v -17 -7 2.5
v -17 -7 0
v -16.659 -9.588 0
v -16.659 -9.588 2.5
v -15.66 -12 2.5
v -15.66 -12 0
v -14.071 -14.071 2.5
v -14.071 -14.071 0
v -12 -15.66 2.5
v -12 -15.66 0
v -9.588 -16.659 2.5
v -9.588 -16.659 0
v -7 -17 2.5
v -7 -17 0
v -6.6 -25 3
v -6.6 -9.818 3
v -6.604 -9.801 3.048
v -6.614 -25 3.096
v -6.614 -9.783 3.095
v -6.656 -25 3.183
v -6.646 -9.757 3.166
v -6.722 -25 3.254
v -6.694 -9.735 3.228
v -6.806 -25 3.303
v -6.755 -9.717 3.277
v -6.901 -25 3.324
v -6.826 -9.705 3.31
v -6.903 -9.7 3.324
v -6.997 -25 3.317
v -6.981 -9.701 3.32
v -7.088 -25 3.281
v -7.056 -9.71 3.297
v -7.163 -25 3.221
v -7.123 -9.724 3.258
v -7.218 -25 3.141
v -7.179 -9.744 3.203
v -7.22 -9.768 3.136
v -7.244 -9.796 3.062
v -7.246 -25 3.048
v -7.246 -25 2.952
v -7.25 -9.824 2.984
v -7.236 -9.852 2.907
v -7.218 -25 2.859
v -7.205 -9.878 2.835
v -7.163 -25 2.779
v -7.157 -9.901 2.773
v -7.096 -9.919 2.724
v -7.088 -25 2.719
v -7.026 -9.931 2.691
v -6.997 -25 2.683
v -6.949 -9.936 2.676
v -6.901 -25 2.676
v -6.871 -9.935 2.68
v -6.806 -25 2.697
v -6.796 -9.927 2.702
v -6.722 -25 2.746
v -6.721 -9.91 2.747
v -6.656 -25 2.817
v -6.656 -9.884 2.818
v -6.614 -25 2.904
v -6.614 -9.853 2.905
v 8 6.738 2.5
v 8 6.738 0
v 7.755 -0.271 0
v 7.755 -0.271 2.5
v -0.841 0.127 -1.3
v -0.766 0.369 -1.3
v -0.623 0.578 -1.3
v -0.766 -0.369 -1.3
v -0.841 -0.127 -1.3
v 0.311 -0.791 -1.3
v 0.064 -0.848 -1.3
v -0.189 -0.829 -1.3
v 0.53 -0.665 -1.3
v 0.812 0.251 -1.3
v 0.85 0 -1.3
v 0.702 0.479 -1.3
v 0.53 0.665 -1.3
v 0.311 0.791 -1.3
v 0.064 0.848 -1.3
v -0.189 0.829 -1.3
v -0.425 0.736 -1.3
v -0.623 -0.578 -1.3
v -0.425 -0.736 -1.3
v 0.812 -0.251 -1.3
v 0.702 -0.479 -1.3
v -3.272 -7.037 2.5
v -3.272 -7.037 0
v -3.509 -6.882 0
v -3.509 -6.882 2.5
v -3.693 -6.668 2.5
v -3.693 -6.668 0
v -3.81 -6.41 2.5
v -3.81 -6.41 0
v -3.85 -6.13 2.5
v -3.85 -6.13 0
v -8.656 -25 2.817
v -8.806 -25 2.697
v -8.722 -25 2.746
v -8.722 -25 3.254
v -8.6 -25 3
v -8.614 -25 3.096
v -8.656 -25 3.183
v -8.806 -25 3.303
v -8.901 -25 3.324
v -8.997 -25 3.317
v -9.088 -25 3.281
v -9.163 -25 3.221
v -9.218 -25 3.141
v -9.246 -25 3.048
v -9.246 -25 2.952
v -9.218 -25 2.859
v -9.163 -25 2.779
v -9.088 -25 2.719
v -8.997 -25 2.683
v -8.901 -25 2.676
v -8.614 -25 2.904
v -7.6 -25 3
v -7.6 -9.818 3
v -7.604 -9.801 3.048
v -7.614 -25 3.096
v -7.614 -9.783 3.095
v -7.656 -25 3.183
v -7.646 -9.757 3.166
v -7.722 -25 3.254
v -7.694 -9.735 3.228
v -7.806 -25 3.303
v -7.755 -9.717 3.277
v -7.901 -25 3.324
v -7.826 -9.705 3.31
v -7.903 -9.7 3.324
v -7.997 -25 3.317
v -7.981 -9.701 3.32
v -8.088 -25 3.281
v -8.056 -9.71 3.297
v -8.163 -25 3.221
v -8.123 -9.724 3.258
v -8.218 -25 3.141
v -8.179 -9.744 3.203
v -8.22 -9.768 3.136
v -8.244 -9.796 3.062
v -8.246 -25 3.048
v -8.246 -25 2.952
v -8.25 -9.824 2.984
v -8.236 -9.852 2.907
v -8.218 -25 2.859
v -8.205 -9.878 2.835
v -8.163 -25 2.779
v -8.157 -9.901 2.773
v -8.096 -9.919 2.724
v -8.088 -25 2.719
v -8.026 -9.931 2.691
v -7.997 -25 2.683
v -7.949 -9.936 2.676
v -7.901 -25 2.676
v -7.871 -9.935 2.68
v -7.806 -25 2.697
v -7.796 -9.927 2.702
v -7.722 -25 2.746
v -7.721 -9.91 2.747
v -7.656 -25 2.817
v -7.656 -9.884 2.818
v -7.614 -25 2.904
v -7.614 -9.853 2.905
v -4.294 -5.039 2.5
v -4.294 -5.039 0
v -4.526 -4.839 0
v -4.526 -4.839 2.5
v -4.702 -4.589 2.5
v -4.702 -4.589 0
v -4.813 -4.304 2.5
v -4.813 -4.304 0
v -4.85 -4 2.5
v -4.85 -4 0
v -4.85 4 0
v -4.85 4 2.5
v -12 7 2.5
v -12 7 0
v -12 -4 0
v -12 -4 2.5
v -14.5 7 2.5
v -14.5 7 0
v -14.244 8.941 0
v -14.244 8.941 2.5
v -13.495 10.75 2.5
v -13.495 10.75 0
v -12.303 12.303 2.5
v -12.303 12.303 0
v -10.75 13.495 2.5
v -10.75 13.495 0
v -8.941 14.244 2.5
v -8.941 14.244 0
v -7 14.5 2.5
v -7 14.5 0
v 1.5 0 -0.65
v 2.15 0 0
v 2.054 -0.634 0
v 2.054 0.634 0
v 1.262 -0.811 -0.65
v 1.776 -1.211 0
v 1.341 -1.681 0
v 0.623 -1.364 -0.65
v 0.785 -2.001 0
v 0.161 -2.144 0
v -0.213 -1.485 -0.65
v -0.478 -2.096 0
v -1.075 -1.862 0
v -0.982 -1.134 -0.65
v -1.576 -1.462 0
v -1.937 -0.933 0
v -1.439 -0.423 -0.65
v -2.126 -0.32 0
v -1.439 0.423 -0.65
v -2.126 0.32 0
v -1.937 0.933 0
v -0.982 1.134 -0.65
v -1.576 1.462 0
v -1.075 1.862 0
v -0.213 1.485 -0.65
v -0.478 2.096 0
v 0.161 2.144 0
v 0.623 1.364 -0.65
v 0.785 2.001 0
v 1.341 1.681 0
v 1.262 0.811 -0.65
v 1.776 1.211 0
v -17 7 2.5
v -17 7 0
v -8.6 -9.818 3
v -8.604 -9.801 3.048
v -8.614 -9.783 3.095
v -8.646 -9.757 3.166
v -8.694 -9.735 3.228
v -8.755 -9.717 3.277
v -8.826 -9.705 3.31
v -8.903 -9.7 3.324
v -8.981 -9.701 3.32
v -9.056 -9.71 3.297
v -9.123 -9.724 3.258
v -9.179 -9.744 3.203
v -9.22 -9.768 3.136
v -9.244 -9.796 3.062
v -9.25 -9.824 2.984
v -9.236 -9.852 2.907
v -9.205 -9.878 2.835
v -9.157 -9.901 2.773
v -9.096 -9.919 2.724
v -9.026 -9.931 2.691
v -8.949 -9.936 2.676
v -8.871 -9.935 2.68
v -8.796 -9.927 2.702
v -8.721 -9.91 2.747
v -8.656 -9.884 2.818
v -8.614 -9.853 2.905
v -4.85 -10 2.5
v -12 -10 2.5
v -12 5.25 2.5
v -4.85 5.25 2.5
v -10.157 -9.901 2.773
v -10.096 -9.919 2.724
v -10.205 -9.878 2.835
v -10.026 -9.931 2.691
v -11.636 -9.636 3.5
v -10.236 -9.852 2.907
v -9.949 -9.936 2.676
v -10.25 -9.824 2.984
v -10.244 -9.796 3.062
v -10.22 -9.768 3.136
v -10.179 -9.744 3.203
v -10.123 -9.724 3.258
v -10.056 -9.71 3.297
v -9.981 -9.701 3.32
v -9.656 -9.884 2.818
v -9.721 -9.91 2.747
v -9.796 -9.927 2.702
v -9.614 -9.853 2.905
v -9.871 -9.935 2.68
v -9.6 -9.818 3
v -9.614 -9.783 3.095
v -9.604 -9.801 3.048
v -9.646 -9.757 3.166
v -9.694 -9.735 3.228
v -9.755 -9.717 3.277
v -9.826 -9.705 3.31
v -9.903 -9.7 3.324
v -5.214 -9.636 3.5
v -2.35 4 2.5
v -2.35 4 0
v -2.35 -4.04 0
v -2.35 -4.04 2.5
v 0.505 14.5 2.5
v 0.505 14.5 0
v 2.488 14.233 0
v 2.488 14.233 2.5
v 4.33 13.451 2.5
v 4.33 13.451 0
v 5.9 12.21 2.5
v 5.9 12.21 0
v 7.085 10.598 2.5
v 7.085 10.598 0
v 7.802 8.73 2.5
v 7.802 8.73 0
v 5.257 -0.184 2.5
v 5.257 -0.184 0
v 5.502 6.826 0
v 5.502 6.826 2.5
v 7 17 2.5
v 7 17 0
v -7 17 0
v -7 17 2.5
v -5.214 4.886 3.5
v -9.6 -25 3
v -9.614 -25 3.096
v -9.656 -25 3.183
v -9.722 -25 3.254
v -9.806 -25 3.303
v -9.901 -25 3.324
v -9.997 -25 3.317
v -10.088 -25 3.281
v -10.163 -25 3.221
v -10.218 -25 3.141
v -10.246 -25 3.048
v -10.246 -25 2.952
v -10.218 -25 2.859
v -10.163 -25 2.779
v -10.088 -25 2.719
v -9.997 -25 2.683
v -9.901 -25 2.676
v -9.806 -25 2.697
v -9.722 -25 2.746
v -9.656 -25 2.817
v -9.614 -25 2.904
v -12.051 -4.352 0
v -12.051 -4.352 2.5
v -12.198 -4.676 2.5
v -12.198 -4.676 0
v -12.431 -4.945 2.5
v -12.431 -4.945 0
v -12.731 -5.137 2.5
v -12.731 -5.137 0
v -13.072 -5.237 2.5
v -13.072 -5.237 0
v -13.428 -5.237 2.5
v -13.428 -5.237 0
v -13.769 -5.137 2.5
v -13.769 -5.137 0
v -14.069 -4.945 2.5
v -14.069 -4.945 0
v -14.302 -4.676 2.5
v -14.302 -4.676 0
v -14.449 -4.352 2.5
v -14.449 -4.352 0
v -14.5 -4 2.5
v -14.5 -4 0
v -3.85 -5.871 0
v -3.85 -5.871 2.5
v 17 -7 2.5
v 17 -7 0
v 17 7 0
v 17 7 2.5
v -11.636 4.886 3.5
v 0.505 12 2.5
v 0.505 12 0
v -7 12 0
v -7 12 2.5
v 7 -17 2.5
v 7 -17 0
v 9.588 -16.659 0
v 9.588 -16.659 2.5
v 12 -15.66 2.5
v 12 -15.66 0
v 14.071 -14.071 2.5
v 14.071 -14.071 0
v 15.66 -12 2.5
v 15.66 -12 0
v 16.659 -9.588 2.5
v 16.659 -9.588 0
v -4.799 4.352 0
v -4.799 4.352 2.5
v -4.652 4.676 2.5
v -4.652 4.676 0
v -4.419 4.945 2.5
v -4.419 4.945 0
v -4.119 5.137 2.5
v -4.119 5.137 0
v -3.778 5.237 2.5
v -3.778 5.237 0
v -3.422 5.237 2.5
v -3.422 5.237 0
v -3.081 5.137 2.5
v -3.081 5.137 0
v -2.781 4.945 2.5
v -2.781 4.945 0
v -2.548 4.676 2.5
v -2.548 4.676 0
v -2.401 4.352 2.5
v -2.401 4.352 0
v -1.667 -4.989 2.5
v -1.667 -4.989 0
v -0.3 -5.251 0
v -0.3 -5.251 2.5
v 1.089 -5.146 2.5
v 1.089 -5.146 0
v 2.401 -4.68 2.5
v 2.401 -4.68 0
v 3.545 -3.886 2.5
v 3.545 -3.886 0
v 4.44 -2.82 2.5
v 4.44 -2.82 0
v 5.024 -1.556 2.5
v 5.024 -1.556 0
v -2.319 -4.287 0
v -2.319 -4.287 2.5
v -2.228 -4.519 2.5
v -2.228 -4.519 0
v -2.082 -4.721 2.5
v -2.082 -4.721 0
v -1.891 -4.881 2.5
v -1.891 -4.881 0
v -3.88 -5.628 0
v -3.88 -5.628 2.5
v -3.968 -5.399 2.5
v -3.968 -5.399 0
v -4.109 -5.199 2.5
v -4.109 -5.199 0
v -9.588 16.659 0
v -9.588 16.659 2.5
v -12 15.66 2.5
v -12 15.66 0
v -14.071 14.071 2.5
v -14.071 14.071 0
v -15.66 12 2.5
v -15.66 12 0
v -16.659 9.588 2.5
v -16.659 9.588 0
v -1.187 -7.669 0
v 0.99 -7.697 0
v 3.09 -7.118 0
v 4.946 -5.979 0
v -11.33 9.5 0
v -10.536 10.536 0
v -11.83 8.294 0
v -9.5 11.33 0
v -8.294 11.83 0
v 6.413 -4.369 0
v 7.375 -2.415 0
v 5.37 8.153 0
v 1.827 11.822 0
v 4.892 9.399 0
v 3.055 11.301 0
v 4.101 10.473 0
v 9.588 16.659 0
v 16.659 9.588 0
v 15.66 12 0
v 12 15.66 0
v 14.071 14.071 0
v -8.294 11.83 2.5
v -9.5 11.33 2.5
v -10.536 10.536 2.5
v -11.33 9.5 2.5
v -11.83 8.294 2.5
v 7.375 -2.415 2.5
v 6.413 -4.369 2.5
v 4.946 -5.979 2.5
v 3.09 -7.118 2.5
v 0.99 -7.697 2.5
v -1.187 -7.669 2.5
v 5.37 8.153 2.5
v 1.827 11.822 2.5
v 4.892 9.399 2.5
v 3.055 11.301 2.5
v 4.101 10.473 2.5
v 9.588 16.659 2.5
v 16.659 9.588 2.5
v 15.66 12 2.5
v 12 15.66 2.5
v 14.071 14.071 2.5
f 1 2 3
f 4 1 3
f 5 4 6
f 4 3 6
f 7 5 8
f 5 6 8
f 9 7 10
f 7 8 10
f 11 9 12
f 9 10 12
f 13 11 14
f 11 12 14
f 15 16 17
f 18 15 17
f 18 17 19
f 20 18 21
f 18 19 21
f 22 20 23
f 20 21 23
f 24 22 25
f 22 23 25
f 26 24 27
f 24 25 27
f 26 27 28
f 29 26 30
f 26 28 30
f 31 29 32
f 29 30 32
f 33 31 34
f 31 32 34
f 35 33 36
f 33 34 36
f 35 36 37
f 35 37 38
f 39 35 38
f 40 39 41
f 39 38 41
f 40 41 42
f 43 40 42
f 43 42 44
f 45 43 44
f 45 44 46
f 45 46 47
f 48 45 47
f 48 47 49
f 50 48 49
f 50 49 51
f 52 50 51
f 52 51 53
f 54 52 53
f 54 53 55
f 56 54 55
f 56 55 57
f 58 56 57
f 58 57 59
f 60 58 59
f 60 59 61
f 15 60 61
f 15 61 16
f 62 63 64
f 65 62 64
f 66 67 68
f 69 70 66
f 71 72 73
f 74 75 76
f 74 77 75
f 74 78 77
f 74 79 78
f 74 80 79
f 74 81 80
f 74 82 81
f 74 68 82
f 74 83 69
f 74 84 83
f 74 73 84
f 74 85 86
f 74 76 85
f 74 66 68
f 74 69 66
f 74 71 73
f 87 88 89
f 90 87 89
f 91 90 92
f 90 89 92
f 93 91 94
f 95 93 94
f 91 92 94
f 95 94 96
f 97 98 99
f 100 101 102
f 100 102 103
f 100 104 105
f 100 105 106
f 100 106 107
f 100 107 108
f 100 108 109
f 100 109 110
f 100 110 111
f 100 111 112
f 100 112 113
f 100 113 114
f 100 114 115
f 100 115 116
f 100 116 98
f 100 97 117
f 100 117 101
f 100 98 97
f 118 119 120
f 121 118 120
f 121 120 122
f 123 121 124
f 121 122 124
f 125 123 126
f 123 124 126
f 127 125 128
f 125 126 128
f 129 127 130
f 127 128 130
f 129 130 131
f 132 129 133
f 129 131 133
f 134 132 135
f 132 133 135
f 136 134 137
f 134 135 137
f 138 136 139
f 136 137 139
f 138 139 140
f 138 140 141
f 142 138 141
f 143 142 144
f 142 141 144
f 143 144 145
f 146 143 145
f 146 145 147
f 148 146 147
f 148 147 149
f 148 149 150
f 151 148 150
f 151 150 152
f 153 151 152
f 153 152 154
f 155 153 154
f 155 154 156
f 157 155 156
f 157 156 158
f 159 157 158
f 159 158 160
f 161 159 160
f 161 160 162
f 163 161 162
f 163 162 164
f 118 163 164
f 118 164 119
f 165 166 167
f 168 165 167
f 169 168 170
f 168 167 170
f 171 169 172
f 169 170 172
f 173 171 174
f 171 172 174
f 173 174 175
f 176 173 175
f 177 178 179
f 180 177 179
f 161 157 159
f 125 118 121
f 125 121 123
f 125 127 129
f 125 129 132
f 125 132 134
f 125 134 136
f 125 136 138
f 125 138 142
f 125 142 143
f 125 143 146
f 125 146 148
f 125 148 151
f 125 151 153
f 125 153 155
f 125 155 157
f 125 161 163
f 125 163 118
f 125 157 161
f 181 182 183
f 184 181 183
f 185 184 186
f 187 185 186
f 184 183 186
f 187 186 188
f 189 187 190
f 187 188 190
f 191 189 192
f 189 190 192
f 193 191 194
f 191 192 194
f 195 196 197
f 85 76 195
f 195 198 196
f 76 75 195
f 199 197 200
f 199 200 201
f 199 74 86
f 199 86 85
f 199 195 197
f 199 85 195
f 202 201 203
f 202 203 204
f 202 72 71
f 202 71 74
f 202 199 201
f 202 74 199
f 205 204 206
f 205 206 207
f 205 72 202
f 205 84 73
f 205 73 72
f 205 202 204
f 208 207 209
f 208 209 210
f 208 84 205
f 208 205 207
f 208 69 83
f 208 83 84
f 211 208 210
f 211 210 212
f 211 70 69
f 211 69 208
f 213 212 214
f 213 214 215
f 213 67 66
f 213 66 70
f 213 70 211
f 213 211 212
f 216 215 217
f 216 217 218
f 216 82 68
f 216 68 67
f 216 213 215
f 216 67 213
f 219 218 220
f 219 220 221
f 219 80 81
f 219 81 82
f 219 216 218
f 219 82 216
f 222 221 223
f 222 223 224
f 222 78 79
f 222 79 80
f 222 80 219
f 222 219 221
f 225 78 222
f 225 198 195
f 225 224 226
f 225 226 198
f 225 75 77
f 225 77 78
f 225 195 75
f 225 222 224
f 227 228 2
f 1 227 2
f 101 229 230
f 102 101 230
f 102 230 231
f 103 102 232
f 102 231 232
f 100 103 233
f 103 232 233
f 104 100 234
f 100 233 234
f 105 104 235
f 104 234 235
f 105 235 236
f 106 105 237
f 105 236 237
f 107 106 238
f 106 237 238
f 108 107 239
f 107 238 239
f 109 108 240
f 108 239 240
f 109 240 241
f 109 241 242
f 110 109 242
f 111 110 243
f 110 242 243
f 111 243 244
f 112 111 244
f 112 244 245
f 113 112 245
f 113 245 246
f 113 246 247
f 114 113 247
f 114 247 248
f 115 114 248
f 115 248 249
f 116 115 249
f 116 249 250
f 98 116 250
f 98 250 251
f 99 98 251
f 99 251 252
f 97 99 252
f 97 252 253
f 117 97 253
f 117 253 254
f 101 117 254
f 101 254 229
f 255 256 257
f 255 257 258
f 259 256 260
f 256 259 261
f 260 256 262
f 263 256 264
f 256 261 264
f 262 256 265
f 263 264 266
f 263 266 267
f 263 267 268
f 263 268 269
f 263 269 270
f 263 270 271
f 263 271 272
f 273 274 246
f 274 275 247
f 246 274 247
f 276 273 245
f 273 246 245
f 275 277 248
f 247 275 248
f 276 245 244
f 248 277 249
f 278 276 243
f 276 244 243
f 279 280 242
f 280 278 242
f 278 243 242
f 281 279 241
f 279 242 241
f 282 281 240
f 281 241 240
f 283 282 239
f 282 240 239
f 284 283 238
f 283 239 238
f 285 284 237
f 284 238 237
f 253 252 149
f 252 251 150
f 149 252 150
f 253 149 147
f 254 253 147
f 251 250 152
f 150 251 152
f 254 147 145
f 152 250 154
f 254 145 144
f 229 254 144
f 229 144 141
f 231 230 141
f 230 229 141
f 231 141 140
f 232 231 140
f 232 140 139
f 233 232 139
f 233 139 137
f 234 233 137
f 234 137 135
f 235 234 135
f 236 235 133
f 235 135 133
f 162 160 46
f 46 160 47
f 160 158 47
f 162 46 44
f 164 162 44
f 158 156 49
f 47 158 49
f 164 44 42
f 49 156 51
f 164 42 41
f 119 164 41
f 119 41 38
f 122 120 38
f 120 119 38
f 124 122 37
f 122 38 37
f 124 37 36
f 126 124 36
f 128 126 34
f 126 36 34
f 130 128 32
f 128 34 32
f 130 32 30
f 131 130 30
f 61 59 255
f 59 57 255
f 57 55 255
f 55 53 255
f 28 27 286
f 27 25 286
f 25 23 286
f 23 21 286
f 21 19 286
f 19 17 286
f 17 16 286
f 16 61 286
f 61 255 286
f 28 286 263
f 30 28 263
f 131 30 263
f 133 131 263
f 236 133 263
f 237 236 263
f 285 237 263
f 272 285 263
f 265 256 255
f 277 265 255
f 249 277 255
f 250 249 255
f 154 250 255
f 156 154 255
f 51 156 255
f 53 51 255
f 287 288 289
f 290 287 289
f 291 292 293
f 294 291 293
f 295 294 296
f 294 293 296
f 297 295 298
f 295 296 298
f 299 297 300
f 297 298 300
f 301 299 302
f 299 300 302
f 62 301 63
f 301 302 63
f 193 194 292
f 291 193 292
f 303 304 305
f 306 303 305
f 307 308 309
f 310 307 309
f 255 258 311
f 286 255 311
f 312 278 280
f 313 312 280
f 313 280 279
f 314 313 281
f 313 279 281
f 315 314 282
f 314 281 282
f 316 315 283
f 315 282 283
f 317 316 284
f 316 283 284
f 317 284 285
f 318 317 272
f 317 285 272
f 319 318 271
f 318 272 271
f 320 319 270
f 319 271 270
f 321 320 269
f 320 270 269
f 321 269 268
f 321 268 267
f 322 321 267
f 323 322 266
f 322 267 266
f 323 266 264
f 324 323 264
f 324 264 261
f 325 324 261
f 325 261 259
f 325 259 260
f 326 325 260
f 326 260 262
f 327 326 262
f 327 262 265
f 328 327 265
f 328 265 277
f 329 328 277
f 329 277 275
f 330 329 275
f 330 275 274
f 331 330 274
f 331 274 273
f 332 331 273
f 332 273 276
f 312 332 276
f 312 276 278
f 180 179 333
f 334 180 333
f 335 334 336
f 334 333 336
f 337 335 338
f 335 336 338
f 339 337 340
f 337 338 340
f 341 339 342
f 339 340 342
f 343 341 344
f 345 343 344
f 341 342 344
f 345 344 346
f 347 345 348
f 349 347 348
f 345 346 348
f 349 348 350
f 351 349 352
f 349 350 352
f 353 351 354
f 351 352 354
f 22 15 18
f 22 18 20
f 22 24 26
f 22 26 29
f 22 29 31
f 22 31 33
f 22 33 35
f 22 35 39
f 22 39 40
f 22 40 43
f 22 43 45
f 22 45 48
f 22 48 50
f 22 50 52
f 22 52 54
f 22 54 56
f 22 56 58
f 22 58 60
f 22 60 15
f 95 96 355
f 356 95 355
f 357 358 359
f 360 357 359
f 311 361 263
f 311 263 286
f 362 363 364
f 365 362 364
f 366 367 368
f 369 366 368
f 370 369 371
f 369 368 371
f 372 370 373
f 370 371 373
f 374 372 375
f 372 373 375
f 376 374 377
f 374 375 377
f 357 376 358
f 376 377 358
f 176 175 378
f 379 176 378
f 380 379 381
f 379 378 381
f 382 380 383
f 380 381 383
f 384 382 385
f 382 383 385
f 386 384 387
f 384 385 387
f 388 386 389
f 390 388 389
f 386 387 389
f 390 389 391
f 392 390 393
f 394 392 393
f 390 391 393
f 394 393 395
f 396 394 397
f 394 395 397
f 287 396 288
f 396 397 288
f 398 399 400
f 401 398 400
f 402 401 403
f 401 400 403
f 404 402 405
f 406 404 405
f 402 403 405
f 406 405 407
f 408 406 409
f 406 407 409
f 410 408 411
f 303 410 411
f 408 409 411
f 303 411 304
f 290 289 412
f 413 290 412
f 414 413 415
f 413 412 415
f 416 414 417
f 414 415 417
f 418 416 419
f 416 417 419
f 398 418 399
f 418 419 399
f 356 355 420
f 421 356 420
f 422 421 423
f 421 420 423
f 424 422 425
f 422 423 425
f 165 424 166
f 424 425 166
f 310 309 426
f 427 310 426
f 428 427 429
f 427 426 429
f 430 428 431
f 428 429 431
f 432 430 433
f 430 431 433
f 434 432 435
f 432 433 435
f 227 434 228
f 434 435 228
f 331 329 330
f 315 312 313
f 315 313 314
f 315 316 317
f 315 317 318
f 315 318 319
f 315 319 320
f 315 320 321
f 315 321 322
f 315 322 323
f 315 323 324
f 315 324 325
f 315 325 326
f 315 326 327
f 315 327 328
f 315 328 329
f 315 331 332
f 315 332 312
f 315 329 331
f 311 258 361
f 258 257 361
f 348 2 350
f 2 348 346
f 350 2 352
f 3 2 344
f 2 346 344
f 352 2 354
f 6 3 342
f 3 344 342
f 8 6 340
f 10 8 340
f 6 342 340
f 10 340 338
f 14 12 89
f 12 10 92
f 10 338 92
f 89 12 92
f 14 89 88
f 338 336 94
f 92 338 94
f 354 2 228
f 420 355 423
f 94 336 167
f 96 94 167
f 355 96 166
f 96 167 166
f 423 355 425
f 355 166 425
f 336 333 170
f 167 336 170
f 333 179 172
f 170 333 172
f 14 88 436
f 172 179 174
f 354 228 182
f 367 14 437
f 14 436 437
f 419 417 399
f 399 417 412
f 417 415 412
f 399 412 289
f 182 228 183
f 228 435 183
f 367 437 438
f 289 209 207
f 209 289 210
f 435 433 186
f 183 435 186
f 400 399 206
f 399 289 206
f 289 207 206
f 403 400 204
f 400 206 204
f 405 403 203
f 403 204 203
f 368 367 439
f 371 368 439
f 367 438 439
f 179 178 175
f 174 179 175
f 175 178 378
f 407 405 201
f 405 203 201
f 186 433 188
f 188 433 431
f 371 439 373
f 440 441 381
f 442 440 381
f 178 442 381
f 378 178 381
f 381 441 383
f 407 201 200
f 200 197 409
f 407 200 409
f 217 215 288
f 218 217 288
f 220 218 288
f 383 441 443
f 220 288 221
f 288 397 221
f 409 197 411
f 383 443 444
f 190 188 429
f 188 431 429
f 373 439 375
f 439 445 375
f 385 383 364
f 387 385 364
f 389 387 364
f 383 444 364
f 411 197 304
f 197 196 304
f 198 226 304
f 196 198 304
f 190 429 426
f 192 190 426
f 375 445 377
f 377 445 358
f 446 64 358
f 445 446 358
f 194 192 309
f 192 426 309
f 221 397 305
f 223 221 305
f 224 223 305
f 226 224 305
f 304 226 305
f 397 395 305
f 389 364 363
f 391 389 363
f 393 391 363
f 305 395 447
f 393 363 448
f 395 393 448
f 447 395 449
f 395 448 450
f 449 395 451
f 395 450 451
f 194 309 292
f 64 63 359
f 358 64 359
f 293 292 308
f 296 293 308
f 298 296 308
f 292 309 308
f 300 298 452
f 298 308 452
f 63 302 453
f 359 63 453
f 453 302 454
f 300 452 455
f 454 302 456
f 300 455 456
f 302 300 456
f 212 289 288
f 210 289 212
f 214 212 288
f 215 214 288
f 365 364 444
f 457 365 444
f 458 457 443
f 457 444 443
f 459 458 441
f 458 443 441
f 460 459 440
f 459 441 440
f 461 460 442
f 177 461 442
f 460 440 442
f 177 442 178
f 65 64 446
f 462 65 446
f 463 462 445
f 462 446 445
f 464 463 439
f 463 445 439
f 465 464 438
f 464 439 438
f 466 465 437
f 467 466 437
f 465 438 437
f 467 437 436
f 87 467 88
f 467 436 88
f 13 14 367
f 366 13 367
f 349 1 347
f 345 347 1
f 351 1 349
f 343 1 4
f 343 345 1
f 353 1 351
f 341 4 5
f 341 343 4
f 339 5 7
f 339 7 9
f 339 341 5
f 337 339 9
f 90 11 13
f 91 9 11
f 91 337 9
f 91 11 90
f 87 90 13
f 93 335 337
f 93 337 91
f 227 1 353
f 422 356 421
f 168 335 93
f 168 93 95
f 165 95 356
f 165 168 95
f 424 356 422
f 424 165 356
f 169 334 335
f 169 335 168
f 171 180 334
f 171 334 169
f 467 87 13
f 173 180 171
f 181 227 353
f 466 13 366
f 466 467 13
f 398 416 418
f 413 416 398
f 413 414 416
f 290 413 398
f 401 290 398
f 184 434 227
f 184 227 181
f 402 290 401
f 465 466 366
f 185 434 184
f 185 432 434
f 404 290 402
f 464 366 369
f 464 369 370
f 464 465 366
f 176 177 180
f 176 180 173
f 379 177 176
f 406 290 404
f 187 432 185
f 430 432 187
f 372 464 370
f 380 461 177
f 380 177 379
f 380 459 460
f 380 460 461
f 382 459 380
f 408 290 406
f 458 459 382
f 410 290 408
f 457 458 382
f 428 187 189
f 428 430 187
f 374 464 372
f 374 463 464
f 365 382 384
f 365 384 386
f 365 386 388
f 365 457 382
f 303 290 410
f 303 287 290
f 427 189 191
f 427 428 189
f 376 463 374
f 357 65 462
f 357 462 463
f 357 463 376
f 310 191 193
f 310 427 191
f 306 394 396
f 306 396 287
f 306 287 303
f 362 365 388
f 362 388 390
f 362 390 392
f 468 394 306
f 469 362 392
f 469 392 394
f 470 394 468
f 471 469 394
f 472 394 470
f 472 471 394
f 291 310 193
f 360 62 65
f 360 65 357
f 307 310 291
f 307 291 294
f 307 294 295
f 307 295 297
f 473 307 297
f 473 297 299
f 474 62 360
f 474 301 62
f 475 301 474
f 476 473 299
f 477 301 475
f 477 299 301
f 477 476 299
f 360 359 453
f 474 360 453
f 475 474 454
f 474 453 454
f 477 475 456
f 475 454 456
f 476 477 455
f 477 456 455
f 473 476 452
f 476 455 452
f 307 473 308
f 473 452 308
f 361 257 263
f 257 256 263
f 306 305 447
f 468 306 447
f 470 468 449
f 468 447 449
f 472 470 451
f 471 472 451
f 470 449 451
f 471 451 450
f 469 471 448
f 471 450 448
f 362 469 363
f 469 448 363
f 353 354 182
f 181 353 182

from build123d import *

# Parameters (mm, degrees)
F1_DEPTH = 2.5
F3_DEPTH = 1
F3_TAPER = 20
F4_R     = 0.325
F5_DEPTH = 25
F6_R     = 2.15
F7_DEPTH = 1.3
F7_TAPER = 45


with BuildPart() as f1:
    # F0 (on Top) → F1 (new body)
    with BuildSketch(Plane.XY):
        with BuildLine():
            Line((-7, -17), (7, -17))
            ThreePointArc((7, -17), (14.0710678119, -14.0710678119), (17, -7))
            Line((17, -7), (17, 7))
            ThreePointArc((17, 7), (14.0710678119, 14.0710678119), (7, 17))
            Line((7, 17), (-7, 17))
            ThreePointArc((-7, 17), (-14.0710678119, 14.0710678119), (-17, 7))
            Line((-17, 7), (-17, -7))
            ThreePointArc((-17, -7), (-14.0710678119, -14.0710678119), (-7, -17))
        make_face()
        with BuildLine():
            Line((-7, 14.5), (0.5045687974, 14.5))
            ThreePointArc((0.5045687974, 14.5), (5.8996172999, 12.2099377784), (8, 6.7382537747))
            Line((8, 6.7382537747), (7.7552377898, -0.2708188712))
            ThreePointArc((7.7552377898, -0.2708188712), (4.0582864832, -6.6141792278), (-3.271599819, -7.0365965254))
            ThreePointArc((-3.271599819, -7.0365965254), (-3.6930895027, -6.6675877975), (-3.85, -6.129814527))
            Line((-3.85, -6.129814527), (-3.85, -5.8708286934))
            ThreePointArc((-3.85, -5.8708286934), (-3.9680828963, -5.3994241726), (-4.2944444444, -5.0393492741))
            ThreePointArc((-4.2944444444, -5.0393492741), (-4.7023963796, -4.589255651), (-4.85, -4))
            Line((-4.85, -4), (-4.85, 4))
            ThreePointArc((-4.85, 4), (-3.6, 5.25), (-2.35, 4))
            Line((-2.35, 4), (-2.35, -4.0403961912))
            ThreePointArc((-2.35, -4.0403961912), (-2.1614505579, -4.6248172655), (-1.6669040158, -4.9888538048))
            ThreePointArc((-1.6669040158, -4.9888538048), (2.9990757899, -4.3212007232), (5.2567607222, -0.1835701295))
            Line((5.2567607222, -0.1835701295), (5.5015229325, 6.8255025165))
            ThreePointArc((5.5015229325, 6.8255025165), (4.1012677991, 10.4732918523), (0.5045687974, 12))
            Line((0.5045687974, 12), (-7, 12))
            ThreePointArc((-7, 12), (-10.5355339059, 10.5355339059), (-12, 7))
            Line((-12, 7), (-12, -4))
            ThreePointArc((-12, -4), (-13.25, -5.25), (-14.5, -4))
            Line((-14.5, -4), (-14.5, 7))
            ThreePointArc((-14.5, 7), (-12.3033008589, 12.3033008589), (-7, 14.5))
        make_face(mode=Mode.SUBTRACT)
    extrude(amount=F1_DEPTH)

    # F6 (on face) → F7 (join)
    with BuildSketch(Plane(origin=(0, 0, 0), x_dir=(1, 0, 0), z_dir=(0, 0, -1))):
        Circle(F6_R)
    extrude(amount=F7_DEPTH, taper=F7_TAPER)


with BuildPart() as f3:
    # F2 (on face) → F3 (new body)
    with BuildSketch(Plane.XY.offset(2.5)):
        Polygon((-12, 5.25), (-12, -4), (-12, -10), (-4.85, -10), (-4.85, -4), (-4.85, 4), (-4.85, 5.25), align=None)
    extrude(amount=F3_DEPTH, taper=F3_TAPER)

    # F4 (on Front) → F5 (join)
    with BuildSketch(Plane.XZ):
        with Locations((-9.925, 3)):
            Circle(F4_R)
        with Locations((-8.925, 3)):
            Circle(F4_R)
        with Locations((-7.925, 3)):
            Circle(F4_R)
        with Locations((-6.925, 3)):
            Circle(F4_R)
    extrude(amount=F5_DEPTH)


solid = Compound([f1.part, f3.part])
